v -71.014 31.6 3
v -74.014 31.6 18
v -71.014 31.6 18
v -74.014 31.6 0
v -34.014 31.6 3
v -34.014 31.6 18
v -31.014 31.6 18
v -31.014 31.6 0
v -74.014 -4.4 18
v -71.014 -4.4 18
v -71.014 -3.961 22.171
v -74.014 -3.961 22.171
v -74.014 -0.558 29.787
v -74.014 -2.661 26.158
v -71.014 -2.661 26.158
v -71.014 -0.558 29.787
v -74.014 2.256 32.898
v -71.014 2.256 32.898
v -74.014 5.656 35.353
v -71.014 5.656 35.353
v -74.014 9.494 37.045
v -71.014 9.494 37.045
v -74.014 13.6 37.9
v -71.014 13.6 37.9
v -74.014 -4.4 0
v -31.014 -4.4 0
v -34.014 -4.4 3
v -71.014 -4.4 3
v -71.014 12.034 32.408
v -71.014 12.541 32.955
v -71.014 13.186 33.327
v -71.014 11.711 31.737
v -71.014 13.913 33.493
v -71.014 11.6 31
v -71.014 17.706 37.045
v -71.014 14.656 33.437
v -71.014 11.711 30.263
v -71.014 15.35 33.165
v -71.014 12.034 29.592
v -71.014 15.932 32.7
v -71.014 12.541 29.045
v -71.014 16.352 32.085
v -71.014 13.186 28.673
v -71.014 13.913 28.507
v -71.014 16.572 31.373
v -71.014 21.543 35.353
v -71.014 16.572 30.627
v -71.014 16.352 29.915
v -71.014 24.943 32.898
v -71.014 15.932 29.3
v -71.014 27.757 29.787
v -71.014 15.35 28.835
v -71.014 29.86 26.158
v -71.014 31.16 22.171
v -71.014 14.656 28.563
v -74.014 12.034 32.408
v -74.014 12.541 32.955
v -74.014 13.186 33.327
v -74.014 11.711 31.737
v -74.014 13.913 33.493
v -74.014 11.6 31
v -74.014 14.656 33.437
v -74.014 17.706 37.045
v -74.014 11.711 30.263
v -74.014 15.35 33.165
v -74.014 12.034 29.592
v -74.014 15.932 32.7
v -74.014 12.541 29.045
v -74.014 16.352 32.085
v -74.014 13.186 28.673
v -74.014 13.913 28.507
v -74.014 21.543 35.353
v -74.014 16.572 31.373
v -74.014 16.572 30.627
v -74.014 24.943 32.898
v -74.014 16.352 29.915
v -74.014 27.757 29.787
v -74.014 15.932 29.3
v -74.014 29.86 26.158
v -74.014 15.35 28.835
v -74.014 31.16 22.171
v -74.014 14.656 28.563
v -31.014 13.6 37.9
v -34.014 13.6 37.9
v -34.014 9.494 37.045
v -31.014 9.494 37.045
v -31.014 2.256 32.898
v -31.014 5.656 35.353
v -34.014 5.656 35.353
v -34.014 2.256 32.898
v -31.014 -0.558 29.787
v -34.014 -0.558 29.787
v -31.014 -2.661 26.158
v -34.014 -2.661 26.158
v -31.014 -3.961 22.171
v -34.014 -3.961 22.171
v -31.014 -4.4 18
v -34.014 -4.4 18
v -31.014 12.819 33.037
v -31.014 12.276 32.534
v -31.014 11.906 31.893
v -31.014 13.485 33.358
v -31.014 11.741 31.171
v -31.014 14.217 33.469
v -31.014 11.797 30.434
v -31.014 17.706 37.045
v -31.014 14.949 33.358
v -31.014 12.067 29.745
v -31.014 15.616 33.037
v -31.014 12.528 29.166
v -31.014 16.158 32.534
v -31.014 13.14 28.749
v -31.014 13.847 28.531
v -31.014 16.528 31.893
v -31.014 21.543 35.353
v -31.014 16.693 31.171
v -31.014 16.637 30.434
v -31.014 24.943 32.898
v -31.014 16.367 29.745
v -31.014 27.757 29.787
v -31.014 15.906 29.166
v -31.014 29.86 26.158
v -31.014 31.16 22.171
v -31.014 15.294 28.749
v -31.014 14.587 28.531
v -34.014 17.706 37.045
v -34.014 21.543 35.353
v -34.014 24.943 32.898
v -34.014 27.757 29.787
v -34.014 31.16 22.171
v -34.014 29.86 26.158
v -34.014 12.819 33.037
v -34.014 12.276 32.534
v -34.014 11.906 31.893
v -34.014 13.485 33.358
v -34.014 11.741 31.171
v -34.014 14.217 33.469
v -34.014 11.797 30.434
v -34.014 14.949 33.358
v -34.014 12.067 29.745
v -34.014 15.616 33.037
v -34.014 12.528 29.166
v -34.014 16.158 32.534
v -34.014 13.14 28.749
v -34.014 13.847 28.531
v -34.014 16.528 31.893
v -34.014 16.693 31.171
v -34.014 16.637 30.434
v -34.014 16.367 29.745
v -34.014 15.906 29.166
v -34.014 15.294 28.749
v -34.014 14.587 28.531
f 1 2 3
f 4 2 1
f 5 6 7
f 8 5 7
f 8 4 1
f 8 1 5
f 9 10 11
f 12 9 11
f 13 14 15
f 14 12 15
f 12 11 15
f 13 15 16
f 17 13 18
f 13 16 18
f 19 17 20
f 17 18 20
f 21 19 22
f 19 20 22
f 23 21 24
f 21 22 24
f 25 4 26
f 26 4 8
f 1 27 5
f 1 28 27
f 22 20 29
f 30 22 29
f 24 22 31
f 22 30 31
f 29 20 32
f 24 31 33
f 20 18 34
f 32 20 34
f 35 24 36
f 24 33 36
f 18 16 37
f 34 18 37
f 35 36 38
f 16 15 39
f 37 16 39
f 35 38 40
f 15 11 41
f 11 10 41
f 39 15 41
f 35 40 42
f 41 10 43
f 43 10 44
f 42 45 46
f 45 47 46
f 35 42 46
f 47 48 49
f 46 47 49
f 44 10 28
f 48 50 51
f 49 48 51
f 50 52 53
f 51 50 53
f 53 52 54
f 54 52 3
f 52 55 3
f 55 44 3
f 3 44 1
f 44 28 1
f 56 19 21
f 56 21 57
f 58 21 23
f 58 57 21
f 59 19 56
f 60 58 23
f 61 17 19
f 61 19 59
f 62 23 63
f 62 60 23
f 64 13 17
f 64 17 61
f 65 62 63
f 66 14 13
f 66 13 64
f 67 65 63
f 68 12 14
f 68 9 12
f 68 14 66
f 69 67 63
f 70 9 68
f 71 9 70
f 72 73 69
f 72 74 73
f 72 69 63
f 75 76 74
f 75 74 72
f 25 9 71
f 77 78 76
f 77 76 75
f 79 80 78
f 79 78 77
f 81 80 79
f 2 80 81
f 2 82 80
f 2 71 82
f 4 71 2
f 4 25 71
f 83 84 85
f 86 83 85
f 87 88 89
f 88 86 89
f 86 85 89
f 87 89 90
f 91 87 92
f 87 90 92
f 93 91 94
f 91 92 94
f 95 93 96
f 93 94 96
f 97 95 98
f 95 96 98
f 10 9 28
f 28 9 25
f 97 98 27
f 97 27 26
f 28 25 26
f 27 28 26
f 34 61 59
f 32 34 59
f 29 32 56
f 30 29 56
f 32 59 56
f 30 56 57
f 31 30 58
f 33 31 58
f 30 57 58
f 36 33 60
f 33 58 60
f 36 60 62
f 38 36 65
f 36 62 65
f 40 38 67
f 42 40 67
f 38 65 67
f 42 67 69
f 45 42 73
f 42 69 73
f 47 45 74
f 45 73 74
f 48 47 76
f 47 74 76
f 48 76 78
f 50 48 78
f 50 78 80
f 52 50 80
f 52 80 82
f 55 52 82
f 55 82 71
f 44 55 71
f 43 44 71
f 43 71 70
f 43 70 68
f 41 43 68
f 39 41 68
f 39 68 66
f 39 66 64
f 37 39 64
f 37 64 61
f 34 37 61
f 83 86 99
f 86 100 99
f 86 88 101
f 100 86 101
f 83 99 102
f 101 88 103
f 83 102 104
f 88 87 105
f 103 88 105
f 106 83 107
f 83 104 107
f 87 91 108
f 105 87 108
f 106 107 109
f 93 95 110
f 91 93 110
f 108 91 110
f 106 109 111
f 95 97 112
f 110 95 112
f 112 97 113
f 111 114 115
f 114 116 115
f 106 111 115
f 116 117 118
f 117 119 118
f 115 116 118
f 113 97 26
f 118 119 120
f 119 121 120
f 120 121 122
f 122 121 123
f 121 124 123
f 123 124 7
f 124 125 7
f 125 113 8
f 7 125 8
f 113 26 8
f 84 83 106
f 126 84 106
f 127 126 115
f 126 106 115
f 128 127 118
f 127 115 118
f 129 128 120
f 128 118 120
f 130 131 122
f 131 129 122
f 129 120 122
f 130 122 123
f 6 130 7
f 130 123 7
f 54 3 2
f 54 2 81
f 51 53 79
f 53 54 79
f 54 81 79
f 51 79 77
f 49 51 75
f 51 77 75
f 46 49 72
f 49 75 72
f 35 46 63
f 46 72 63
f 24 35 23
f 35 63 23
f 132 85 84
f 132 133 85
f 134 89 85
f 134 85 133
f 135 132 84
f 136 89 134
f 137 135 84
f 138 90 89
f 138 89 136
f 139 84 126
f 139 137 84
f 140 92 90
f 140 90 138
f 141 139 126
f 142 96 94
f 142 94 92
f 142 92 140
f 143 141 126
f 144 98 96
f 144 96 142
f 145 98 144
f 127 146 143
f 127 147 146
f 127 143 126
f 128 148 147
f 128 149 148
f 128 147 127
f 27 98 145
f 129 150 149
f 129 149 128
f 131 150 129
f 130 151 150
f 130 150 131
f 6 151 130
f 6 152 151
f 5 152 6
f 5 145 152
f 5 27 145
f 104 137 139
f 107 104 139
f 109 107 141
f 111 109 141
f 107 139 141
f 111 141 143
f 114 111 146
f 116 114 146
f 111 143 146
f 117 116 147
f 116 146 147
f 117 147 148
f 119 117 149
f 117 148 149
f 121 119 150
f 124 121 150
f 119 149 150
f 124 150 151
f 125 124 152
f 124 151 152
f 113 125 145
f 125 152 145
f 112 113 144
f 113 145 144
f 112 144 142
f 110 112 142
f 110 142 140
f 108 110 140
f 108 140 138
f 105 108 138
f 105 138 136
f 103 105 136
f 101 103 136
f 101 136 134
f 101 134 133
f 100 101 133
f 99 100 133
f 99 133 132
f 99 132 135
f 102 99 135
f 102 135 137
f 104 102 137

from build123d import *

# Parameters (mm, degrees)
ESQUISSE1_W             = 43
ESQUISSE1_H             = 36
BOSS_EXTRU_1_DEPTH      = 3
ESQUISSE2_W             = 3
ESQUISSE2_H             = 36
BOSS_EXTRU_2_DEPTH      = 25
ESQUISSE3_W             = 3
ESQUISSE3_H             = 36
BOSS_EXTRU_3_DEPTH      = 35
ESQUISSE4_R             = 2.5
ENL_V_MAT_EXTRU_1_DEPTH = 95
CONG_1_R                = 20
ESQUISSE5_W             = 46.070025289
ESQUISSE5_H             = 43.599493682
ENL_V_MAT_EXTRU_2_DEPTH = 95
ESQUISSE6_W             = 3
ESQUISSE6_H             = 36
BOSS_EXTRU_4_DEPTH      = 35
ESQUISSE7_R             = 2.482615241
ENL_V_MAT_EXTRU_3_DEPTH = 35
CONG_2_R                = 20


with BuildPart() as part:
    # Esquisse1 → Boss.-Extru.1 (new body)
    with BuildSketch(Plane.XY):
        with Locations((-52.514246193, 13.599576988)):
            Rectangle(ESQUISSE1_W, ESQUISSE1_H)
    extrude(amount=BOSS_EXTRU_1_DEPTH)

    # Esquisse2 → Boss.-Extru.2 (add)
    with BuildSketch(Plane.XY.offset(3)):
        with Locations((-32.514246193, 13.599576988)):
            Rectangle(ESQUISSE2_W, ESQUISSE2_H)
    extrude(amount=BOSS_EXTRU_2_DEPTH)

    # Esquisse3 → Boss.-Extru.3 (add)
    with BuildSketch(Plane.XY.offset(3)):
        with Locations((-72.514246193, 13.599576988)):
            Rectangle(ESQUISSE3_W, ESQUISSE3_H)
    extrude(amount=BOSS_EXTRU_3_DEPTH)

    # Esquisse4 → Enlèv. mat.-Extru.1 (cut)
    with BuildSketch(Plane.ZY.offset(74.014246193)):
        with Locations(Location((31, 14.099576988, 0), (0, 0, 270))):
            Circle(ESQUISSE4_R)
    extrude(amount=-ENL_V_MAT_EXTRU_1_DEPTH, mode=Mode.SUBTRACT)

    # Congé1
    # the kernel refuses this fillet: 20 mm, written as the material it takes off along each edge
    with BuildSketch(Plane(origin=(-34.014246193, -4.400423012, 28), x_dir=(0, 1, 0), z_dir=(1, 0, 0))) as cong_1_piece_1:
        with BuildLine():
            CenterArc((CONG_1_R, -CONG_1_R), CONG_1_R, 90, 90)
            Line((0, -CONG_1_R), (0, 0))
            Line((0, 0), (CONG_1_R, 0))
        make_face()
    extrude(amount=53, mode=Mode.SUBTRACT)
    with BuildSketch(Plane(origin=(18.985753807, 31.599576988, 28), x_dir=(0, 0, -1), z_dir=(-1, 0, 0))) as cong_1_piece_2:
        with BuildLine():
            CenterArc((CONG_1_R, CONG_1_R), CONG_1_R, 180, 90)
            Line((0, CONG_1_R), (0, 0))
            Line((0, 0), (CONG_1_R, 0))
        make_face()
    extrude(amount=53, mode=Mode.SUBTRACT)
    with BuildSketch(Plane(origin=(-21.014246193, -4.400423012, 38), x_dir=(0, 1, 0), z_dir=(-1, 0, 0))) as cong_1_piece_3:
        with BuildLine():
            CenterArc((CONG_1_R, CONG_1_R), CONG_1_R, 180, 90)
            Line((0, CONG_1_R), (0, 0))
            Line((0, 0), (CONG_1_R, 0))
        make_face()
    extrude(amount=103, mode=Mode.SUBTRACT)
    with BuildSketch(Plane(origin=(-124.014246193, 31.599576988, 38), x_dir=(0, 0, -1), z_dir=(1, 0, 0))) as cong_1_piece_4:
        with BuildLine():
            CenterArc((CONG_1_R, -CONG_1_R), CONG_1_R, 90, 90)
            Line((0, -CONG_1_R), (0, 0))
            Line((0, 0), (CONG_1_R, 0))
        make_face()
    extrude(amount=103, mode=Mode.SUBTRACT)

    # Esquisse5 → Enlèv. mat.-Extru.2 (cut)
    with BuildSketch(Plane.ZY.offset(34.014246193)):
        with Locations((26.035012645, 9.799830147)):
            Rectangle(ESQUISSE5_W, ESQUISSE5_H)
    extrude(amount=-ENL_V_MAT_EXTRU_2_DEPTH, mode=Mode.SUBTRACT)

    # Esquisse6 → Boss.-Extru.4 (add)
    with BuildSketch(Plane.XY.offset(3)):
        with Locations((-32.514246193, 13.599576988)):
            Rectangle(ESQUISSE6_W, ESQUISSE6_H)
    extrude(amount=BOSS_EXTRU_4_DEPTH)

    # Esquisse7 → Enlèv. mat.-Extru.3 (cut)
    with BuildSketch(Plane.ZY.offset(34.014246193)):
        with Locations((30.985935606, 14.217034277)):
            Circle(ESQUISSE7_R)
    extrude(amount=-ENL_V_MAT_EXTRU_3_DEPTH, mode=Mode.SUBTRACT)

    # Congé2
    # the kernel refuses this fillet: 20 mm, written as the material it takes off along each edge
    with BuildSketch(Plane(origin=(-84.014246193, -4.400423012, 38), x_dir=(0, 1, 0), z_dir=(1, 0, 0))) as cong_2_piece_1:
        with BuildLine():
            CenterArc((CONG_2_R, -CONG_2_R), CONG_2_R, 90, 90)
            Line((0, -CONG_2_R), (0, 0))
            Line((0, 0), (CONG_2_R, 0))
        make_face()
    extrude(amount=103, mode=Mode.SUBTRACT)
    with BuildSketch(Plane(origin=(18.985753807, 31.599576988, 38), x_dir=(0, 0, -1), z_dir=(-1, 0, 0))) as cong_2_piece_2:
        with BuildLine():
            CenterArc((CONG_2_R, CONG_2_R), CONG_2_R, 180, 90)
            Line((0, CONG_2_R), (0, 0))
            Line((0, 0), (CONG_2_R, 0))
        make_face()
    extrude(amount=103, mode=Mode.SUBTRACT)


solid = part.part
